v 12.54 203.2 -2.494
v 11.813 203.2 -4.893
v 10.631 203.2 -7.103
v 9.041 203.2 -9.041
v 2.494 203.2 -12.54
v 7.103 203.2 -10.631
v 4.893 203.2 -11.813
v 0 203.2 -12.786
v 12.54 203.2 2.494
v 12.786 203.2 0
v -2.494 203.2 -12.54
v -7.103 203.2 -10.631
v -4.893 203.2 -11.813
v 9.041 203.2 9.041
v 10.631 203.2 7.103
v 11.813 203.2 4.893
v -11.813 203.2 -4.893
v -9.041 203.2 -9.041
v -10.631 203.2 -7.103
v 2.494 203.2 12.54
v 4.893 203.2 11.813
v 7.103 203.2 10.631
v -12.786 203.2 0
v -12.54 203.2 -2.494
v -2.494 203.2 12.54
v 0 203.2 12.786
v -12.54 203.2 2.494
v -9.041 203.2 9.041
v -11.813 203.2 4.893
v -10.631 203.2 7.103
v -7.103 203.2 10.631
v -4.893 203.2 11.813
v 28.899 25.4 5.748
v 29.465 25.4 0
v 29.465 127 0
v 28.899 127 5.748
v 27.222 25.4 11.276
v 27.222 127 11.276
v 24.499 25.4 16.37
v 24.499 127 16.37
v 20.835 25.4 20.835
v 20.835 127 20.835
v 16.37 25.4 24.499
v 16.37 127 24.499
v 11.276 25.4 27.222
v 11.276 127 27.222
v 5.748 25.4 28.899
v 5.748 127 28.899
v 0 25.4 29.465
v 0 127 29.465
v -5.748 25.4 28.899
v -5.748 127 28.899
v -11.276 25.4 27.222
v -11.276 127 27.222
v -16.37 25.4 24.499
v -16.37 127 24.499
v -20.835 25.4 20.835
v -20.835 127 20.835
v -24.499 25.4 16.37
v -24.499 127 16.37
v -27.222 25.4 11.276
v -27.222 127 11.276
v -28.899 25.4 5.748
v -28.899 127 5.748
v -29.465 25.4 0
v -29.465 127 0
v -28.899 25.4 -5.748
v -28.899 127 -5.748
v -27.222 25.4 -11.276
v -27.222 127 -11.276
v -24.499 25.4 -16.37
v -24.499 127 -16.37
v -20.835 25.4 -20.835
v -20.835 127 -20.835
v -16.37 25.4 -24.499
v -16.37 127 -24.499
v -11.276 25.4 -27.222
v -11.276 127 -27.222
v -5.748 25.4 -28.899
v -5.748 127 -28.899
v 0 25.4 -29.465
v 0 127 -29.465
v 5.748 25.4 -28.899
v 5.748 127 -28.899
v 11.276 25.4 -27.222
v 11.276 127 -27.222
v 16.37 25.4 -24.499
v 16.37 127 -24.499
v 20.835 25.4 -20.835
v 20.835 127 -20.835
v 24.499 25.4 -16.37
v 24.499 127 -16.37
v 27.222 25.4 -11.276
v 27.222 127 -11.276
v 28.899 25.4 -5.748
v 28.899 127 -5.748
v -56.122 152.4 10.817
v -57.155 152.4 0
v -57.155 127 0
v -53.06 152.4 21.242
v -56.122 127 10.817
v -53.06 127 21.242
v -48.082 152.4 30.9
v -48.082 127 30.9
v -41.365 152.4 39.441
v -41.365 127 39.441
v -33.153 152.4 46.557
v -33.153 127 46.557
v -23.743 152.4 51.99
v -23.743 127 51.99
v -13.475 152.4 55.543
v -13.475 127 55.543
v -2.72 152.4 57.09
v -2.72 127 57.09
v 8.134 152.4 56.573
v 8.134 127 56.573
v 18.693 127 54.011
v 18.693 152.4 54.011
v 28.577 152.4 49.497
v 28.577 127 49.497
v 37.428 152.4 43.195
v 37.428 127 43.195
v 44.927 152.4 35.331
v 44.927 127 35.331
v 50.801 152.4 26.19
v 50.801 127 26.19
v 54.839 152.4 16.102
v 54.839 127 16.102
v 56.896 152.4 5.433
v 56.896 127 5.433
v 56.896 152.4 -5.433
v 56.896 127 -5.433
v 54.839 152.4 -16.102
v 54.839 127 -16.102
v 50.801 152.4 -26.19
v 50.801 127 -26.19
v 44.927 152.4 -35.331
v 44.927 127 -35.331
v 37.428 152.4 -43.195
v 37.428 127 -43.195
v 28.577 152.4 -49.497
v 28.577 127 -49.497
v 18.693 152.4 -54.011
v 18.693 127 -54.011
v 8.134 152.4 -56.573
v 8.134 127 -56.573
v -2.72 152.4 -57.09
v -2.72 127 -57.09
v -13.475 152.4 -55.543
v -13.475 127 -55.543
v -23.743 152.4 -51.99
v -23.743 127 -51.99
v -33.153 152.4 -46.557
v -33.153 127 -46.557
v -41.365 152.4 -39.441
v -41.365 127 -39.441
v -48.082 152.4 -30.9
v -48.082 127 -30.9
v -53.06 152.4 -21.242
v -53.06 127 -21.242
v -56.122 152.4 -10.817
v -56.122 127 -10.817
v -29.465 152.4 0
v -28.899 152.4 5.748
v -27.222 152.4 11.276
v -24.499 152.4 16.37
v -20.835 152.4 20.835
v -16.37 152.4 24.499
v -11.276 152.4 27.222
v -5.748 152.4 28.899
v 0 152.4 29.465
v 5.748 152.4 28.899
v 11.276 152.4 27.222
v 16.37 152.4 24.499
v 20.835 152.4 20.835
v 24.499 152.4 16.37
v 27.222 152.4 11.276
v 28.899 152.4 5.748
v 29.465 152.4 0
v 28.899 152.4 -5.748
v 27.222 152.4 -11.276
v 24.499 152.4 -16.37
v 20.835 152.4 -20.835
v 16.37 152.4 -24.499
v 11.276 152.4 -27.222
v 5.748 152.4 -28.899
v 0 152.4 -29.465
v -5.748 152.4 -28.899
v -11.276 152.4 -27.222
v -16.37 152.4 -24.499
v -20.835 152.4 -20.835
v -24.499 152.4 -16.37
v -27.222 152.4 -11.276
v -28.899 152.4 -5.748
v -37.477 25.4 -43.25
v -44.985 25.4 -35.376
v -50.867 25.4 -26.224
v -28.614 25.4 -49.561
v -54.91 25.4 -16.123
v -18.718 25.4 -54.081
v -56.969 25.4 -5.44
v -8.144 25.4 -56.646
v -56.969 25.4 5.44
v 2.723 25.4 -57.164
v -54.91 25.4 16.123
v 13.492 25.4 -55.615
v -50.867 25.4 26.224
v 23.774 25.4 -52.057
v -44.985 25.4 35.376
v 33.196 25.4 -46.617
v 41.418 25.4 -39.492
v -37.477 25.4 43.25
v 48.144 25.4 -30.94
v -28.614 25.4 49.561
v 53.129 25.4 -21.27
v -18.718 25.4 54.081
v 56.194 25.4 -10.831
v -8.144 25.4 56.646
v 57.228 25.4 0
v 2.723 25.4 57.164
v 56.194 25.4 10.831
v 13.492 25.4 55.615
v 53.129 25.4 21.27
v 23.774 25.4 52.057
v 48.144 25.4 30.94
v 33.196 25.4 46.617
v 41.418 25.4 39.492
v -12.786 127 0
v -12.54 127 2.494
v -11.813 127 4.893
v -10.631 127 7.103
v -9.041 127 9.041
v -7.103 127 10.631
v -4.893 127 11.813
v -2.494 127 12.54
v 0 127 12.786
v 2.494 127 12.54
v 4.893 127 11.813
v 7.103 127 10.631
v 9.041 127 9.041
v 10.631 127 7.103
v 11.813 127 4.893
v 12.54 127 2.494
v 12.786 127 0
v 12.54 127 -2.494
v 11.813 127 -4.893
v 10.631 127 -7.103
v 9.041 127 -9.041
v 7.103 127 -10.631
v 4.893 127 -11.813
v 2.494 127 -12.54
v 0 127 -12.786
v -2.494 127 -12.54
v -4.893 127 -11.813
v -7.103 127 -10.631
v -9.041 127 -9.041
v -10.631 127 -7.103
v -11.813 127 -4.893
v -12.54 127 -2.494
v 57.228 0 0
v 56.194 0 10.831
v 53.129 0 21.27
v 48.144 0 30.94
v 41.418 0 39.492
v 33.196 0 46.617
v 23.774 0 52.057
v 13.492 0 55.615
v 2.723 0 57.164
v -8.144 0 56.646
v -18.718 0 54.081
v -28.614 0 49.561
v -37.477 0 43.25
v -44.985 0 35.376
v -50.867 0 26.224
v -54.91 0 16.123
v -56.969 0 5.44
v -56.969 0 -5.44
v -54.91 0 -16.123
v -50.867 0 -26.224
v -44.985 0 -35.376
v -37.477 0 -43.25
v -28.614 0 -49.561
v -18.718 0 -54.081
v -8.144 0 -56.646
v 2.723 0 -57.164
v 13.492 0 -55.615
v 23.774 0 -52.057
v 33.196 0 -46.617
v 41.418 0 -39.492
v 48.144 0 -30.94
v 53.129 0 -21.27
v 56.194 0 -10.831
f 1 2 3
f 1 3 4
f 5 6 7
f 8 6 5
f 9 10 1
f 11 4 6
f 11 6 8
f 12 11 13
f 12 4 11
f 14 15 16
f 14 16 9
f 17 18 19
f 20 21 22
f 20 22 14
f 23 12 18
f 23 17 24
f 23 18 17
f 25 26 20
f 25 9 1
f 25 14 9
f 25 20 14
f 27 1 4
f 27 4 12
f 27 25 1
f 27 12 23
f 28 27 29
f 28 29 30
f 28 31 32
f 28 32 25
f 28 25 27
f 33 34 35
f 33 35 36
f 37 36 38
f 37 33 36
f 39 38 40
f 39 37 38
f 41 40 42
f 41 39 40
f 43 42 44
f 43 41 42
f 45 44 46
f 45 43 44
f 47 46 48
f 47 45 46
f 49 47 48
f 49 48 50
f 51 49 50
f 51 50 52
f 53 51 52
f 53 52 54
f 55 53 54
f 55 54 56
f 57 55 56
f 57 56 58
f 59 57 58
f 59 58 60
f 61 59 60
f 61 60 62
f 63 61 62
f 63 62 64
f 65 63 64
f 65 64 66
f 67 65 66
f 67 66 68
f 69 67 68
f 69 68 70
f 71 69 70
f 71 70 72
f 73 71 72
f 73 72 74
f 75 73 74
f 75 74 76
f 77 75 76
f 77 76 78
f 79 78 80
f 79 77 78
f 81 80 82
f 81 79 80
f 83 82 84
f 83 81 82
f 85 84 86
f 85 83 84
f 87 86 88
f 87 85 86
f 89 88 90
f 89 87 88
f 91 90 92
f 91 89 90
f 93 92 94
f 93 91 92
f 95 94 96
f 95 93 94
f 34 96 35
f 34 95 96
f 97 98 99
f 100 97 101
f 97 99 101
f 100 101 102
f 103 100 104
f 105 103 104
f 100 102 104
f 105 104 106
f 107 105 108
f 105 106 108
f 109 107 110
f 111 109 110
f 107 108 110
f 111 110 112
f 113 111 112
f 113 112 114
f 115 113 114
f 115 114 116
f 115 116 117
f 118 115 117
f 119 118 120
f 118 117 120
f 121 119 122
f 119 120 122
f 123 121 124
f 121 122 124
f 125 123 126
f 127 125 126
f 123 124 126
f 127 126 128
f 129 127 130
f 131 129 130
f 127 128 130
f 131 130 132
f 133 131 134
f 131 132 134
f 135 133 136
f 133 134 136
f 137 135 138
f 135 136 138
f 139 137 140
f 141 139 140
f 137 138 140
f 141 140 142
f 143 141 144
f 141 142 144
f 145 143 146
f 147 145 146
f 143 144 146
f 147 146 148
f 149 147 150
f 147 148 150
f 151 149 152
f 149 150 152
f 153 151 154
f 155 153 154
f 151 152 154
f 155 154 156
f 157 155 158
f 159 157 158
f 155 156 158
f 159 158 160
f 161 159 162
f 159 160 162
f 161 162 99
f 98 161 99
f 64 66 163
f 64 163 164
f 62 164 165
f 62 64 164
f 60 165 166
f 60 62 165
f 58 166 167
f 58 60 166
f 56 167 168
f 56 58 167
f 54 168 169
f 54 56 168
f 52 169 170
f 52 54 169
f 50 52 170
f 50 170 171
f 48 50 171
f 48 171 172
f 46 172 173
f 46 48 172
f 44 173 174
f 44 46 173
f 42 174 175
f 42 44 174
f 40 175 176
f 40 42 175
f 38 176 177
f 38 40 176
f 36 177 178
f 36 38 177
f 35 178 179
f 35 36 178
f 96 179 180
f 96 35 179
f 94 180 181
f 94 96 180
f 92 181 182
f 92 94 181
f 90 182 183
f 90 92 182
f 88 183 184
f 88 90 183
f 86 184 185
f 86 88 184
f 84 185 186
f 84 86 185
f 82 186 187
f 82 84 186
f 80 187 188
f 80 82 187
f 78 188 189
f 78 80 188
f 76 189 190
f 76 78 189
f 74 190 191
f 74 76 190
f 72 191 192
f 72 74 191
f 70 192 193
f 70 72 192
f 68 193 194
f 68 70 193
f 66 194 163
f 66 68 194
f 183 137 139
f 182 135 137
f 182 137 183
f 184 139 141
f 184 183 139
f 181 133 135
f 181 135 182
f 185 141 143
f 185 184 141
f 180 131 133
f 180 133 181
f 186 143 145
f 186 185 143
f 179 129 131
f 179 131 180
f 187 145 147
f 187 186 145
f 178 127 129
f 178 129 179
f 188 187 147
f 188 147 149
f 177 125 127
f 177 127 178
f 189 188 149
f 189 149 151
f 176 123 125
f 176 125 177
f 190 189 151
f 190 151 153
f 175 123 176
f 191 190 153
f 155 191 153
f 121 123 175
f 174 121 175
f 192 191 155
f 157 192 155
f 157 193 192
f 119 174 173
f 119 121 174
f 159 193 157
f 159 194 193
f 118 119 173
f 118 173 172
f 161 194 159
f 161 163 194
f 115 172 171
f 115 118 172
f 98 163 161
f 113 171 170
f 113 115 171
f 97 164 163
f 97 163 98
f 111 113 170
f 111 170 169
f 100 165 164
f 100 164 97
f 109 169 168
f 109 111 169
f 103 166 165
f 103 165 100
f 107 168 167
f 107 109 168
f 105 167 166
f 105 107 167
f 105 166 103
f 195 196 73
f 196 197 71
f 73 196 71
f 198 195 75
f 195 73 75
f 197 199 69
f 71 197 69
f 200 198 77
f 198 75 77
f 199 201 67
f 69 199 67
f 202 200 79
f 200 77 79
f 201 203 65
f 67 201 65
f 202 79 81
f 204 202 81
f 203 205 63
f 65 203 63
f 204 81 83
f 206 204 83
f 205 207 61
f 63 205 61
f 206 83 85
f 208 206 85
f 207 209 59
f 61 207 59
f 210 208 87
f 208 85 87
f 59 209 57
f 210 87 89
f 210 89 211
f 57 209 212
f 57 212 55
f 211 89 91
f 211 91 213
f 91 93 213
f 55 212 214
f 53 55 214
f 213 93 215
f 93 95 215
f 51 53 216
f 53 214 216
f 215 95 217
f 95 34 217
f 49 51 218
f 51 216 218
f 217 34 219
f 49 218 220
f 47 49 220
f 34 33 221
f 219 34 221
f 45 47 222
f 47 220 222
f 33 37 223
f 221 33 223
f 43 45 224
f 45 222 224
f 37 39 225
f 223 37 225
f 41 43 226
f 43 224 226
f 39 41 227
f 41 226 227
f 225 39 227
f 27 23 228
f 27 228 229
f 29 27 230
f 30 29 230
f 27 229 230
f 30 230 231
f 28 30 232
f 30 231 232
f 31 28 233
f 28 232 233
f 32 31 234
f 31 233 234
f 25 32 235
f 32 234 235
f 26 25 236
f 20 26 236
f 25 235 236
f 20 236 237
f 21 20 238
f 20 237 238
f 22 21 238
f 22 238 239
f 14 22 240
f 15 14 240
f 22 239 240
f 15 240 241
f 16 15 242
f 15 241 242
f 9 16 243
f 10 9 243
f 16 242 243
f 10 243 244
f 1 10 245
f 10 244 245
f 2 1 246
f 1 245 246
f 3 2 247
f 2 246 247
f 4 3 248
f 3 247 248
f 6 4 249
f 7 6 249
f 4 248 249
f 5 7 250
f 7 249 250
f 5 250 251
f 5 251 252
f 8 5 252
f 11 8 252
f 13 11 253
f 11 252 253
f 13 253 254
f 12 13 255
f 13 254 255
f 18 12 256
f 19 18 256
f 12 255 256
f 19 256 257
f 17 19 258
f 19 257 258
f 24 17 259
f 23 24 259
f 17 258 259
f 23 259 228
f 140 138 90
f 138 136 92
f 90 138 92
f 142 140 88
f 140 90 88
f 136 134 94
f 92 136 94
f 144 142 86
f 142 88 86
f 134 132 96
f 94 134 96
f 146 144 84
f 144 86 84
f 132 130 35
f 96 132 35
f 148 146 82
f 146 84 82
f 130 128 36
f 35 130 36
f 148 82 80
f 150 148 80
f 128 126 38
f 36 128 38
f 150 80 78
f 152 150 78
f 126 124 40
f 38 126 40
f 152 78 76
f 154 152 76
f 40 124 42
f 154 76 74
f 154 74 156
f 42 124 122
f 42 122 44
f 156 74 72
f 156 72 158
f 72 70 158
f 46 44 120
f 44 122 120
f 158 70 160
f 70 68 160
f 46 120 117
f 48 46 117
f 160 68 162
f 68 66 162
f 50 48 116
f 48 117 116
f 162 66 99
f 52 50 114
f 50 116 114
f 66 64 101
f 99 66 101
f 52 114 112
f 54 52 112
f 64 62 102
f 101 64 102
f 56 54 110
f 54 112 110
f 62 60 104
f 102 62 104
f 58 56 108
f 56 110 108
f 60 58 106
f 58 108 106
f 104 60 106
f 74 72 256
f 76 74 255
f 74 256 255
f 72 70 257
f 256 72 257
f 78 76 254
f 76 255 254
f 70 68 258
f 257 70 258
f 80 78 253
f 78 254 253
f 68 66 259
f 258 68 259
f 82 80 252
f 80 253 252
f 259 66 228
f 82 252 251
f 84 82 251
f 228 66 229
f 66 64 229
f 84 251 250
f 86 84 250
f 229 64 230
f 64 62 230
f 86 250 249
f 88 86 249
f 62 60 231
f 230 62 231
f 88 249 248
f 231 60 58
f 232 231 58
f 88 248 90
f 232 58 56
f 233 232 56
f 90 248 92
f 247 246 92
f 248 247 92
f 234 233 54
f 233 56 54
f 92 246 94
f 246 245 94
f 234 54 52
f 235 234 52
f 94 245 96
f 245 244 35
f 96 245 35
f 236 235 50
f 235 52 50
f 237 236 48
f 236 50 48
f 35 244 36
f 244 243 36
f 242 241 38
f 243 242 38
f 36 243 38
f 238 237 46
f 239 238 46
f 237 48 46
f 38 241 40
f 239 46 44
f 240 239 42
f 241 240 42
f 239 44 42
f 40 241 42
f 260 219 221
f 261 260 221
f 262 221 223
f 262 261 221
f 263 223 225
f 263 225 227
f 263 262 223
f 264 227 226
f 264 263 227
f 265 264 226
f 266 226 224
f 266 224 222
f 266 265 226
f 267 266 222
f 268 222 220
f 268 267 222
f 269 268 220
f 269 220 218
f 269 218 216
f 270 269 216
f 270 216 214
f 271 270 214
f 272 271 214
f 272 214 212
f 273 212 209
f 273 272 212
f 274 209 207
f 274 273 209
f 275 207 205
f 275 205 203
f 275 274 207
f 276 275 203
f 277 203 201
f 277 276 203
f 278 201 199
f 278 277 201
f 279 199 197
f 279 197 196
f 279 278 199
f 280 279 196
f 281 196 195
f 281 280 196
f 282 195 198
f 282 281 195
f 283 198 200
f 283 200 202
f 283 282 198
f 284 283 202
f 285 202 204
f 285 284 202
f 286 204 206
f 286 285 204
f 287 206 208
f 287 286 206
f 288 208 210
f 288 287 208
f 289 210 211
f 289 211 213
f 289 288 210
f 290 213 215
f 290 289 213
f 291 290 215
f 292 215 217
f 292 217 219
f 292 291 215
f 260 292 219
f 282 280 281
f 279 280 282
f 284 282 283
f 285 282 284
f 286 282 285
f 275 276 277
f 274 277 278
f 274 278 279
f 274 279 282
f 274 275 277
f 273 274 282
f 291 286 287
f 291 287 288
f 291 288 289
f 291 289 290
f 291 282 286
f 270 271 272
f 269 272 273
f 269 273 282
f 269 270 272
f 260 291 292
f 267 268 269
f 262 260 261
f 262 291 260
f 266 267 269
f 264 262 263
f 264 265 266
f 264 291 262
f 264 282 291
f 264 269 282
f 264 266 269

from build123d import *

# Parameters (mm, degrees)
F0_R     = 57.228461
F0_R_2   = 21.323022
F1_DEPTH = 25.4
F2_R     = 29.464868
F3_DEPTH = 127
F4_R     = 57.154598
F4_R_2   = 29.464868
F5_DEPTH = 25.4
F6_R     = 12.785825
F7_DEPTH = 76.2


with BuildPart() as f1:
    # F0 (on Front) → F1 (new body)
    with BuildSketch(Plane.XZ):
        Circle(F0_R)
        Circle(F0_R_2, mode=Mode.SUBTRACT)
        Circle(F0_R_2)
    extrude(amount=-F1_DEPTH)

    # F2 (on Front) → F3 (join)
    with BuildSketch(Plane.XZ):
        Circle(F2_R)
    extrude(amount=-F3_DEPTH)

    # F6 (on face) → F7 (join)
    with BuildSketch(Plane(origin=(0, 127, 0), x_dir=(-1, 0, 0), z_dir=(0, 1, 0))):
        Circle(F6_R)
    extrude(amount=F7_DEPTH)


with BuildPart() as f5:
    # F4 (on face) → F5 (new body)
    with BuildSketch(Plane(origin=(0, 127, 0), x_dir=(-1, 0, 0), z_dir=(0, 1, 0))):
        Circle(F4_R)
        Circle(F4_R_2, mode=Mode.SUBTRACT)
    extrude(amount=F5_DEPTH)


solid = Compound([f1.part, f5.part])
